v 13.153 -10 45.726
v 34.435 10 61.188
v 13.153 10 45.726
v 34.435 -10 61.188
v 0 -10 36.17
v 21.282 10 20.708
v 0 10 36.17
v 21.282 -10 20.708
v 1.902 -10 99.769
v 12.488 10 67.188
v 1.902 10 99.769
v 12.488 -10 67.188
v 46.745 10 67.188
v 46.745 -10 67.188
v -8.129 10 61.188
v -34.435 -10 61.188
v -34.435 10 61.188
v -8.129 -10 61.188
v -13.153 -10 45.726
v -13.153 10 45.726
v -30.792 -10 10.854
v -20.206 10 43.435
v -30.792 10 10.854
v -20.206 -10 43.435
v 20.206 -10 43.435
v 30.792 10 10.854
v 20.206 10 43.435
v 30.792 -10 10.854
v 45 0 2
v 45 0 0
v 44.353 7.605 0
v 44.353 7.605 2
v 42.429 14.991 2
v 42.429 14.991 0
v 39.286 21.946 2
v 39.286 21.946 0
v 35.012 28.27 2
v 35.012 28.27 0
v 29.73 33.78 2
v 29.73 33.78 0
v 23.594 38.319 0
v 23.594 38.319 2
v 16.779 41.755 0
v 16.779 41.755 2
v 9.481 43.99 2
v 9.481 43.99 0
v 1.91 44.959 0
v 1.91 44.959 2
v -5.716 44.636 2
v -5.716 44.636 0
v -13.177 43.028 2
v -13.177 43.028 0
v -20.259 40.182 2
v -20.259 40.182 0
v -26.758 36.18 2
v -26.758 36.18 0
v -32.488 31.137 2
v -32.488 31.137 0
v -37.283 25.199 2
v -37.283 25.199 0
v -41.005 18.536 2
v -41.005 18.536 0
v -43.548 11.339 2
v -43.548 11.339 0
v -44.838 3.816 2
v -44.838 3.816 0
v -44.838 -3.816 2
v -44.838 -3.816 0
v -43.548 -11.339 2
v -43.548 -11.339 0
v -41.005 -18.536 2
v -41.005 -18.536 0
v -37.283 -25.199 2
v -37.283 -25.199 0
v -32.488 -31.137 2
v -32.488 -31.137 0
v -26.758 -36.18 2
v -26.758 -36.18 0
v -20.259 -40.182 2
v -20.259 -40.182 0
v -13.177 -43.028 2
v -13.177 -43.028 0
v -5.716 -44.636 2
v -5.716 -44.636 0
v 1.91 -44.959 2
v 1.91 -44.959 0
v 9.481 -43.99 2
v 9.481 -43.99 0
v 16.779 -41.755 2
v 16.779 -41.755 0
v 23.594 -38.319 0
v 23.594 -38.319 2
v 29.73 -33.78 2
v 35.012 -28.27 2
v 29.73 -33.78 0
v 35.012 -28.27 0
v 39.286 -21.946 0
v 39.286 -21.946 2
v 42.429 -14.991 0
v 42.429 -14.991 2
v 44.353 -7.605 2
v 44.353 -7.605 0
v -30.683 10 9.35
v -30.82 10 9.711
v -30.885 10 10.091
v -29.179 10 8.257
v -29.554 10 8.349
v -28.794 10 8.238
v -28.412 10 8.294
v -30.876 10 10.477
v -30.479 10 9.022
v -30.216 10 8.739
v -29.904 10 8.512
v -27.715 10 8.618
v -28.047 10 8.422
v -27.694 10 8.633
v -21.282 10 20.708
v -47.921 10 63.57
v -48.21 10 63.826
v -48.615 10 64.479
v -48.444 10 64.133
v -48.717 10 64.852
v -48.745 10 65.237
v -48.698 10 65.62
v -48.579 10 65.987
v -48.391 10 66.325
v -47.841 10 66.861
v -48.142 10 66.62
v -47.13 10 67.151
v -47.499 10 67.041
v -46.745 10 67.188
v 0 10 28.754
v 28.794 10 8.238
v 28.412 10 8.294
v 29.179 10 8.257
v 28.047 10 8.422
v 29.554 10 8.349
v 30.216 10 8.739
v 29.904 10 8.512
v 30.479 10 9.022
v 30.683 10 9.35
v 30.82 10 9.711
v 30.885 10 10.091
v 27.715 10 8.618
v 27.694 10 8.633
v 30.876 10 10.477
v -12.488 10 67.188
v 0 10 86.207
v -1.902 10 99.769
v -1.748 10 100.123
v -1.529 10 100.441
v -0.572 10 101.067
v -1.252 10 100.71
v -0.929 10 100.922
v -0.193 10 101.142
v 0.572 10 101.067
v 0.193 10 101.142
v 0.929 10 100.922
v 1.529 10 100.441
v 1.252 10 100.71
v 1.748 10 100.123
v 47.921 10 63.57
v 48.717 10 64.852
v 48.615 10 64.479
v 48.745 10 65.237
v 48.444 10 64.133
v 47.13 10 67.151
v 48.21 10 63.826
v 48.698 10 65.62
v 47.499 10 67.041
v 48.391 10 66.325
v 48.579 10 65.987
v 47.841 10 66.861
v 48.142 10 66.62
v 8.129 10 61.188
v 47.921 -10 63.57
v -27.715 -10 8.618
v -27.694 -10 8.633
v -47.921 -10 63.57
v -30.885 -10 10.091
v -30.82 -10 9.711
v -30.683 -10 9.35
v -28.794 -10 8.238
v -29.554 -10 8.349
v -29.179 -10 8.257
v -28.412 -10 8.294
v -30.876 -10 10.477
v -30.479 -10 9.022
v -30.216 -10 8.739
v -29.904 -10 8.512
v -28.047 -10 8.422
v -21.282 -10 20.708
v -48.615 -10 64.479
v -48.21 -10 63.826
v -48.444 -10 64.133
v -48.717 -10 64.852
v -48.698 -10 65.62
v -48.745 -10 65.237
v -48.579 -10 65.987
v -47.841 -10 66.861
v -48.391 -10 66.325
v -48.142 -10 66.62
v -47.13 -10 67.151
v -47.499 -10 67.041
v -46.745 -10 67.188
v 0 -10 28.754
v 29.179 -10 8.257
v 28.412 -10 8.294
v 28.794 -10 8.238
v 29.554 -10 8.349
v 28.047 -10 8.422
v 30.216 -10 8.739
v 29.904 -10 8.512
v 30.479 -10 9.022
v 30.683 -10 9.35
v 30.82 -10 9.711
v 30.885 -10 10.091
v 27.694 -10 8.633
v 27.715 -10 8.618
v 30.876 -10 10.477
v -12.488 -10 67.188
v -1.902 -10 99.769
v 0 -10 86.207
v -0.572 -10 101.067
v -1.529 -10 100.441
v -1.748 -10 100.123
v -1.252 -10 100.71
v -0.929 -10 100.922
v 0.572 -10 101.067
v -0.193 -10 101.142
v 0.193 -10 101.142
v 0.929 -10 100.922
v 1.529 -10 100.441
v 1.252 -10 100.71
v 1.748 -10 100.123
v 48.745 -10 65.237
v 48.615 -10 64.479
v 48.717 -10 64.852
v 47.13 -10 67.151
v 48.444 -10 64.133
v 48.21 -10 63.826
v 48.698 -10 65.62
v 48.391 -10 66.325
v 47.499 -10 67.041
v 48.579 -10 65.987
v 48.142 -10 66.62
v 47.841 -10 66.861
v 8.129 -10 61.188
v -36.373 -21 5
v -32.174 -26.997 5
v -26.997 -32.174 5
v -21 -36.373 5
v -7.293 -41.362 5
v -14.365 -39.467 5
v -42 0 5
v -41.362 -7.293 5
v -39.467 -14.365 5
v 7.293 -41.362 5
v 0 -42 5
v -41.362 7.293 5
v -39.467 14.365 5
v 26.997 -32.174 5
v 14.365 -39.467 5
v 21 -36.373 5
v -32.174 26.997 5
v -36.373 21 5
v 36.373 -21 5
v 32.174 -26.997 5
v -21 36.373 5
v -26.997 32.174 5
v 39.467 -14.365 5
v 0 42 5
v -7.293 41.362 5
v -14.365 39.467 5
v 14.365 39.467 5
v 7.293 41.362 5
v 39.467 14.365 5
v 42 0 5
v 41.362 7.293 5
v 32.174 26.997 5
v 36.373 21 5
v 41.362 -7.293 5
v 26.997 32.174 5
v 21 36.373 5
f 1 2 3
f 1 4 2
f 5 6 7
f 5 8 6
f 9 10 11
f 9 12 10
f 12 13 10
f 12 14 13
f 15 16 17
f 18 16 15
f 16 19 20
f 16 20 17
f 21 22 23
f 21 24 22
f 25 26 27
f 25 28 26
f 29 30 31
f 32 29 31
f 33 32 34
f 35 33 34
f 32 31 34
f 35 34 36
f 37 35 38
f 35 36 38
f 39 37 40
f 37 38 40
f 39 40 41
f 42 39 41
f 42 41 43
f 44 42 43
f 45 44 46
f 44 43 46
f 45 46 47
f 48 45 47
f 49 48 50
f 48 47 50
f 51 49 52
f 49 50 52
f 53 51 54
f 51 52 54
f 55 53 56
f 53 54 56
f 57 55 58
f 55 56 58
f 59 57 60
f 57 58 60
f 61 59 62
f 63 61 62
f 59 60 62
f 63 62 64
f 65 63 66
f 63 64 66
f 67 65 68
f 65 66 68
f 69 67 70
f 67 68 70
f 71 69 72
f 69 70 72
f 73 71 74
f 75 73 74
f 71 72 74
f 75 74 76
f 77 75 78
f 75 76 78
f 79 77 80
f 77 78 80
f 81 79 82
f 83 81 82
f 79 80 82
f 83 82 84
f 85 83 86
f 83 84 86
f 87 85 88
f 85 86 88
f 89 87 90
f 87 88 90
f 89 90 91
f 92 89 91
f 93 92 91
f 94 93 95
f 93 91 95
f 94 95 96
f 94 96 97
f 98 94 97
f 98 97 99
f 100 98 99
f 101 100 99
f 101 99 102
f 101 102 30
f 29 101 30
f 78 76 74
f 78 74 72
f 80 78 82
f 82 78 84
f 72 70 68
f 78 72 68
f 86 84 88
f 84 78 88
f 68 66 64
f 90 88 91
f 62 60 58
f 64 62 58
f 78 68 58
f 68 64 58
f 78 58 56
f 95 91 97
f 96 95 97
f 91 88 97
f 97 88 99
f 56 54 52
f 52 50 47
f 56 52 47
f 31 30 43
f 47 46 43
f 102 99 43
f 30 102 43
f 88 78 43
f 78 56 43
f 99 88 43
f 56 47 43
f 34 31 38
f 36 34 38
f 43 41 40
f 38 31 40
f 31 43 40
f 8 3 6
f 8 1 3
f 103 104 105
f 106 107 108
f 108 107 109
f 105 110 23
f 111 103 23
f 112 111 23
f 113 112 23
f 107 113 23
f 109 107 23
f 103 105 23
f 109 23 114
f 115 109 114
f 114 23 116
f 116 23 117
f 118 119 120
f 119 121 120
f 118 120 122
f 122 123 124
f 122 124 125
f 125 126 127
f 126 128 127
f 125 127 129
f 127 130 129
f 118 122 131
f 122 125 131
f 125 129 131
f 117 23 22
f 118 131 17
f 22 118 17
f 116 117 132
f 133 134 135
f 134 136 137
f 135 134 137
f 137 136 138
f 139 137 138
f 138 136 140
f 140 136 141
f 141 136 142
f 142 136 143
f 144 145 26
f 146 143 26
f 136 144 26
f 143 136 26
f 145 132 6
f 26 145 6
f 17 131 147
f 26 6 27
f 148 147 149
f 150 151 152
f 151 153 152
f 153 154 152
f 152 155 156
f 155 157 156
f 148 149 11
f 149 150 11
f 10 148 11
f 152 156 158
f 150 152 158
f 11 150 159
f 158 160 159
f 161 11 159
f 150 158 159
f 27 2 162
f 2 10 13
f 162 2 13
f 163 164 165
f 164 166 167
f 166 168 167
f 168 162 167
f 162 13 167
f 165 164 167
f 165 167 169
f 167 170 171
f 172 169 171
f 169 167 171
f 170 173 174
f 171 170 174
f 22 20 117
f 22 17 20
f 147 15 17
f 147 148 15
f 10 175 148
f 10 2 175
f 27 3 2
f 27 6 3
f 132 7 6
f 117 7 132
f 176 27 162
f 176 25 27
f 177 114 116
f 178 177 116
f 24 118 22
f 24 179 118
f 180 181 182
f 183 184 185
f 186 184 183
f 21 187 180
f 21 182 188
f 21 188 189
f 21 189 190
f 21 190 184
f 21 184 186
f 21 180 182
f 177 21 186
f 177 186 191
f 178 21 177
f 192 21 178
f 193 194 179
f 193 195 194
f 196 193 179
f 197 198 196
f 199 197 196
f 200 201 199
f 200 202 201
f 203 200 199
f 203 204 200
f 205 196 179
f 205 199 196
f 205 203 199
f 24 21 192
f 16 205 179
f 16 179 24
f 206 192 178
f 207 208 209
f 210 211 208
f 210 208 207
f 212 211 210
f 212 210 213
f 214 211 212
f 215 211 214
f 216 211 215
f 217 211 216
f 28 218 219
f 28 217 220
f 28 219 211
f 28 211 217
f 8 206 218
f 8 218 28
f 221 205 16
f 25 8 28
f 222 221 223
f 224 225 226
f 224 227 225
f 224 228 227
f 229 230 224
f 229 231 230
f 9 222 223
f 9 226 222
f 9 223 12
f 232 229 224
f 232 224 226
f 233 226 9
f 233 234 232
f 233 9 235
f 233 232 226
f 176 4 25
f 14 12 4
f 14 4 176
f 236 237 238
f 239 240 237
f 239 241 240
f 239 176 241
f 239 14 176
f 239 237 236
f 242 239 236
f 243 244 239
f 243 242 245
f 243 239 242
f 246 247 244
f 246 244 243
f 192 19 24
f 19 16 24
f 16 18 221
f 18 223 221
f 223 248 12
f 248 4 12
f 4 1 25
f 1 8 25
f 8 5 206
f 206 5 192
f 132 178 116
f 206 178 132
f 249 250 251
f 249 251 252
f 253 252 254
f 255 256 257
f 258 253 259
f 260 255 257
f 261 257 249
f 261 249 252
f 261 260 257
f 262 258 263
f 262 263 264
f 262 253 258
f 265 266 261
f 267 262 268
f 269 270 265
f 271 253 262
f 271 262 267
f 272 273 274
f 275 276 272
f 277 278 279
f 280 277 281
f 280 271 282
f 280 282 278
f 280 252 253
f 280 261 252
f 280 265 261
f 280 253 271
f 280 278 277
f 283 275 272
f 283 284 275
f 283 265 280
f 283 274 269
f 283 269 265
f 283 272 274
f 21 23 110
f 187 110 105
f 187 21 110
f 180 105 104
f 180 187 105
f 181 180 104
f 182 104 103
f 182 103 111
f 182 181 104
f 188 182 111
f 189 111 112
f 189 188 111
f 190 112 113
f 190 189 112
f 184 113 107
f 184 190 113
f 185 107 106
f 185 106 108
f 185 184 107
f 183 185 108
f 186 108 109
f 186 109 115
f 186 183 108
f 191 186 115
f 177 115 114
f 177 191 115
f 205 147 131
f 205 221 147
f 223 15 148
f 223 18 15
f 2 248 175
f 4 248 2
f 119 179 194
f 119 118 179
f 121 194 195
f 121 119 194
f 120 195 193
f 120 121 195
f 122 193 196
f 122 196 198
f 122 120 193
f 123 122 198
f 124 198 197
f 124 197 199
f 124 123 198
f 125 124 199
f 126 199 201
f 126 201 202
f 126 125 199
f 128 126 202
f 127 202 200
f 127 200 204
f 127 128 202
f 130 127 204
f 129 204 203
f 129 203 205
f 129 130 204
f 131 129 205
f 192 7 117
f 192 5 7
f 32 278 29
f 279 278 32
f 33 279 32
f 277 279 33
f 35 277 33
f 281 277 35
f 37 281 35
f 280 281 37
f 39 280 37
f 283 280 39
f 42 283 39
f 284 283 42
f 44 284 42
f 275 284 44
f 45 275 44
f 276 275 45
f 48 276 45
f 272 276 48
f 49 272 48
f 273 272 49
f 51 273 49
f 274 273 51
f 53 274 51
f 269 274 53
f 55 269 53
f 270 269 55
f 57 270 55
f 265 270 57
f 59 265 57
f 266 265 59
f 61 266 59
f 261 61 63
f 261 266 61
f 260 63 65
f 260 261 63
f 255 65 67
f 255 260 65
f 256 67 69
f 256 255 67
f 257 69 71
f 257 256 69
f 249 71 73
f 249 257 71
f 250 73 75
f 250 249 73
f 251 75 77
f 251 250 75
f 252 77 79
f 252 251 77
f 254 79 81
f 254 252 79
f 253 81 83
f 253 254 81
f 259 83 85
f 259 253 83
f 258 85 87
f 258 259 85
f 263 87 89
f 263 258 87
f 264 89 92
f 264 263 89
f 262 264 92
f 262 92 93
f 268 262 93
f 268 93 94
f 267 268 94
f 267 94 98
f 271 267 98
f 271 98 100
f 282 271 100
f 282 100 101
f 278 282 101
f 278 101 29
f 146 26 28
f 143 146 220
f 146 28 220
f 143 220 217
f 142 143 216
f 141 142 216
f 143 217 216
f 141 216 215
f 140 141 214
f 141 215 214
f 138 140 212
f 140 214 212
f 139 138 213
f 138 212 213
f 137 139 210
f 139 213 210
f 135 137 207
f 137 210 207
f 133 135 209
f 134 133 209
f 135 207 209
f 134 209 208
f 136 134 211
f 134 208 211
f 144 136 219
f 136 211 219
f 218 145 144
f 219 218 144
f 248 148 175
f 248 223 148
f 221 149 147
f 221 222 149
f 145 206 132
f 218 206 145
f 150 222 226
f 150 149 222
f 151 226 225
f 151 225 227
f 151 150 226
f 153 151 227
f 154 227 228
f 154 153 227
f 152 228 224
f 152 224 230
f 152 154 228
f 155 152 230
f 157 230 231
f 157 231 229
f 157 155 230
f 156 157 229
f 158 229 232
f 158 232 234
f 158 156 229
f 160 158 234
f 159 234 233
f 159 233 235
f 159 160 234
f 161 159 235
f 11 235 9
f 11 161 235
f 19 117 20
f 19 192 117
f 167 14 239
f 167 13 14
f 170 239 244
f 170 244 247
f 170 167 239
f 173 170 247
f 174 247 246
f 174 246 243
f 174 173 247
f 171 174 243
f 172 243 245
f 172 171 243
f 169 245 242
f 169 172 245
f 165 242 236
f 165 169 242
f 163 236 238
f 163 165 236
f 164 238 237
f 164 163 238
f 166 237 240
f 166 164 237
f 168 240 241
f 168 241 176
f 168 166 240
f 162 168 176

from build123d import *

# Parameters (mm, degrees)
F0_R     = 45
F1_DEPTH = 5
F3_DEPTH = 10
F4_SIZE  = 3
F5_R     = 2


with BuildPart() as f1:
    # F0 (on Top) → F1 (new body)
    with BuildSketch(Plane.XY):
        Circle(F0_R)
    extrude(amount=F1_DEPTH)

    # F4
    f4_edges = [f1.edges().sort_by_distance(p)[0] for p in [
        (-45, 0, 5),
    ]]
    chamfer(f4_edges, length=F4_SIZE)


with BuildPart() as f3:
    # F2 (on Front) → F3 (new body, symmetric)
    with BuildSketch(Plane.XZ):
        Polygon((-20.206259, 43.434588), (-32.694414, 5), (-27.694414, 8.632713), (0, 28.753882), (27.694414, 8.632713), (32.694414, 5), (20.206259, 43.434588), (52.900673, 67.188471), (12.488155, 67.188471), (0, 105.623059), (-12.488155, 67.188471), (-52.900673, 67.188471), align=None)
        Polygon((-13.152836, 45.726385), (-34.434571, 61.188471), (-8.1289, 61.188471), (0, 86.206651), (8.1289, 61.188471), (34.434571, 61.188471), (13.152836, 45.726385), (21.281736, 20.708204), (0, 36.17029), (-21.281736, 20.708204), align=None, mode=Mode.SUBTRACT)
    extrude(amount=F3_DEPTH, both=True)

    # F5
    f5_edges = [f3.edges().sort_by_distance(p)[0] for p in [
        (0, 0, 105.623059),
        (52.900673, 0, 67.188471),
        (32.694414, 0, 5),
        (-32.694414, 0, 5),
        (-52.900673, 0, 67.188471),
    ]]
    fillet(f5_edges, radius=F5_R)


solid = Compound([f1.part, f3.part])
